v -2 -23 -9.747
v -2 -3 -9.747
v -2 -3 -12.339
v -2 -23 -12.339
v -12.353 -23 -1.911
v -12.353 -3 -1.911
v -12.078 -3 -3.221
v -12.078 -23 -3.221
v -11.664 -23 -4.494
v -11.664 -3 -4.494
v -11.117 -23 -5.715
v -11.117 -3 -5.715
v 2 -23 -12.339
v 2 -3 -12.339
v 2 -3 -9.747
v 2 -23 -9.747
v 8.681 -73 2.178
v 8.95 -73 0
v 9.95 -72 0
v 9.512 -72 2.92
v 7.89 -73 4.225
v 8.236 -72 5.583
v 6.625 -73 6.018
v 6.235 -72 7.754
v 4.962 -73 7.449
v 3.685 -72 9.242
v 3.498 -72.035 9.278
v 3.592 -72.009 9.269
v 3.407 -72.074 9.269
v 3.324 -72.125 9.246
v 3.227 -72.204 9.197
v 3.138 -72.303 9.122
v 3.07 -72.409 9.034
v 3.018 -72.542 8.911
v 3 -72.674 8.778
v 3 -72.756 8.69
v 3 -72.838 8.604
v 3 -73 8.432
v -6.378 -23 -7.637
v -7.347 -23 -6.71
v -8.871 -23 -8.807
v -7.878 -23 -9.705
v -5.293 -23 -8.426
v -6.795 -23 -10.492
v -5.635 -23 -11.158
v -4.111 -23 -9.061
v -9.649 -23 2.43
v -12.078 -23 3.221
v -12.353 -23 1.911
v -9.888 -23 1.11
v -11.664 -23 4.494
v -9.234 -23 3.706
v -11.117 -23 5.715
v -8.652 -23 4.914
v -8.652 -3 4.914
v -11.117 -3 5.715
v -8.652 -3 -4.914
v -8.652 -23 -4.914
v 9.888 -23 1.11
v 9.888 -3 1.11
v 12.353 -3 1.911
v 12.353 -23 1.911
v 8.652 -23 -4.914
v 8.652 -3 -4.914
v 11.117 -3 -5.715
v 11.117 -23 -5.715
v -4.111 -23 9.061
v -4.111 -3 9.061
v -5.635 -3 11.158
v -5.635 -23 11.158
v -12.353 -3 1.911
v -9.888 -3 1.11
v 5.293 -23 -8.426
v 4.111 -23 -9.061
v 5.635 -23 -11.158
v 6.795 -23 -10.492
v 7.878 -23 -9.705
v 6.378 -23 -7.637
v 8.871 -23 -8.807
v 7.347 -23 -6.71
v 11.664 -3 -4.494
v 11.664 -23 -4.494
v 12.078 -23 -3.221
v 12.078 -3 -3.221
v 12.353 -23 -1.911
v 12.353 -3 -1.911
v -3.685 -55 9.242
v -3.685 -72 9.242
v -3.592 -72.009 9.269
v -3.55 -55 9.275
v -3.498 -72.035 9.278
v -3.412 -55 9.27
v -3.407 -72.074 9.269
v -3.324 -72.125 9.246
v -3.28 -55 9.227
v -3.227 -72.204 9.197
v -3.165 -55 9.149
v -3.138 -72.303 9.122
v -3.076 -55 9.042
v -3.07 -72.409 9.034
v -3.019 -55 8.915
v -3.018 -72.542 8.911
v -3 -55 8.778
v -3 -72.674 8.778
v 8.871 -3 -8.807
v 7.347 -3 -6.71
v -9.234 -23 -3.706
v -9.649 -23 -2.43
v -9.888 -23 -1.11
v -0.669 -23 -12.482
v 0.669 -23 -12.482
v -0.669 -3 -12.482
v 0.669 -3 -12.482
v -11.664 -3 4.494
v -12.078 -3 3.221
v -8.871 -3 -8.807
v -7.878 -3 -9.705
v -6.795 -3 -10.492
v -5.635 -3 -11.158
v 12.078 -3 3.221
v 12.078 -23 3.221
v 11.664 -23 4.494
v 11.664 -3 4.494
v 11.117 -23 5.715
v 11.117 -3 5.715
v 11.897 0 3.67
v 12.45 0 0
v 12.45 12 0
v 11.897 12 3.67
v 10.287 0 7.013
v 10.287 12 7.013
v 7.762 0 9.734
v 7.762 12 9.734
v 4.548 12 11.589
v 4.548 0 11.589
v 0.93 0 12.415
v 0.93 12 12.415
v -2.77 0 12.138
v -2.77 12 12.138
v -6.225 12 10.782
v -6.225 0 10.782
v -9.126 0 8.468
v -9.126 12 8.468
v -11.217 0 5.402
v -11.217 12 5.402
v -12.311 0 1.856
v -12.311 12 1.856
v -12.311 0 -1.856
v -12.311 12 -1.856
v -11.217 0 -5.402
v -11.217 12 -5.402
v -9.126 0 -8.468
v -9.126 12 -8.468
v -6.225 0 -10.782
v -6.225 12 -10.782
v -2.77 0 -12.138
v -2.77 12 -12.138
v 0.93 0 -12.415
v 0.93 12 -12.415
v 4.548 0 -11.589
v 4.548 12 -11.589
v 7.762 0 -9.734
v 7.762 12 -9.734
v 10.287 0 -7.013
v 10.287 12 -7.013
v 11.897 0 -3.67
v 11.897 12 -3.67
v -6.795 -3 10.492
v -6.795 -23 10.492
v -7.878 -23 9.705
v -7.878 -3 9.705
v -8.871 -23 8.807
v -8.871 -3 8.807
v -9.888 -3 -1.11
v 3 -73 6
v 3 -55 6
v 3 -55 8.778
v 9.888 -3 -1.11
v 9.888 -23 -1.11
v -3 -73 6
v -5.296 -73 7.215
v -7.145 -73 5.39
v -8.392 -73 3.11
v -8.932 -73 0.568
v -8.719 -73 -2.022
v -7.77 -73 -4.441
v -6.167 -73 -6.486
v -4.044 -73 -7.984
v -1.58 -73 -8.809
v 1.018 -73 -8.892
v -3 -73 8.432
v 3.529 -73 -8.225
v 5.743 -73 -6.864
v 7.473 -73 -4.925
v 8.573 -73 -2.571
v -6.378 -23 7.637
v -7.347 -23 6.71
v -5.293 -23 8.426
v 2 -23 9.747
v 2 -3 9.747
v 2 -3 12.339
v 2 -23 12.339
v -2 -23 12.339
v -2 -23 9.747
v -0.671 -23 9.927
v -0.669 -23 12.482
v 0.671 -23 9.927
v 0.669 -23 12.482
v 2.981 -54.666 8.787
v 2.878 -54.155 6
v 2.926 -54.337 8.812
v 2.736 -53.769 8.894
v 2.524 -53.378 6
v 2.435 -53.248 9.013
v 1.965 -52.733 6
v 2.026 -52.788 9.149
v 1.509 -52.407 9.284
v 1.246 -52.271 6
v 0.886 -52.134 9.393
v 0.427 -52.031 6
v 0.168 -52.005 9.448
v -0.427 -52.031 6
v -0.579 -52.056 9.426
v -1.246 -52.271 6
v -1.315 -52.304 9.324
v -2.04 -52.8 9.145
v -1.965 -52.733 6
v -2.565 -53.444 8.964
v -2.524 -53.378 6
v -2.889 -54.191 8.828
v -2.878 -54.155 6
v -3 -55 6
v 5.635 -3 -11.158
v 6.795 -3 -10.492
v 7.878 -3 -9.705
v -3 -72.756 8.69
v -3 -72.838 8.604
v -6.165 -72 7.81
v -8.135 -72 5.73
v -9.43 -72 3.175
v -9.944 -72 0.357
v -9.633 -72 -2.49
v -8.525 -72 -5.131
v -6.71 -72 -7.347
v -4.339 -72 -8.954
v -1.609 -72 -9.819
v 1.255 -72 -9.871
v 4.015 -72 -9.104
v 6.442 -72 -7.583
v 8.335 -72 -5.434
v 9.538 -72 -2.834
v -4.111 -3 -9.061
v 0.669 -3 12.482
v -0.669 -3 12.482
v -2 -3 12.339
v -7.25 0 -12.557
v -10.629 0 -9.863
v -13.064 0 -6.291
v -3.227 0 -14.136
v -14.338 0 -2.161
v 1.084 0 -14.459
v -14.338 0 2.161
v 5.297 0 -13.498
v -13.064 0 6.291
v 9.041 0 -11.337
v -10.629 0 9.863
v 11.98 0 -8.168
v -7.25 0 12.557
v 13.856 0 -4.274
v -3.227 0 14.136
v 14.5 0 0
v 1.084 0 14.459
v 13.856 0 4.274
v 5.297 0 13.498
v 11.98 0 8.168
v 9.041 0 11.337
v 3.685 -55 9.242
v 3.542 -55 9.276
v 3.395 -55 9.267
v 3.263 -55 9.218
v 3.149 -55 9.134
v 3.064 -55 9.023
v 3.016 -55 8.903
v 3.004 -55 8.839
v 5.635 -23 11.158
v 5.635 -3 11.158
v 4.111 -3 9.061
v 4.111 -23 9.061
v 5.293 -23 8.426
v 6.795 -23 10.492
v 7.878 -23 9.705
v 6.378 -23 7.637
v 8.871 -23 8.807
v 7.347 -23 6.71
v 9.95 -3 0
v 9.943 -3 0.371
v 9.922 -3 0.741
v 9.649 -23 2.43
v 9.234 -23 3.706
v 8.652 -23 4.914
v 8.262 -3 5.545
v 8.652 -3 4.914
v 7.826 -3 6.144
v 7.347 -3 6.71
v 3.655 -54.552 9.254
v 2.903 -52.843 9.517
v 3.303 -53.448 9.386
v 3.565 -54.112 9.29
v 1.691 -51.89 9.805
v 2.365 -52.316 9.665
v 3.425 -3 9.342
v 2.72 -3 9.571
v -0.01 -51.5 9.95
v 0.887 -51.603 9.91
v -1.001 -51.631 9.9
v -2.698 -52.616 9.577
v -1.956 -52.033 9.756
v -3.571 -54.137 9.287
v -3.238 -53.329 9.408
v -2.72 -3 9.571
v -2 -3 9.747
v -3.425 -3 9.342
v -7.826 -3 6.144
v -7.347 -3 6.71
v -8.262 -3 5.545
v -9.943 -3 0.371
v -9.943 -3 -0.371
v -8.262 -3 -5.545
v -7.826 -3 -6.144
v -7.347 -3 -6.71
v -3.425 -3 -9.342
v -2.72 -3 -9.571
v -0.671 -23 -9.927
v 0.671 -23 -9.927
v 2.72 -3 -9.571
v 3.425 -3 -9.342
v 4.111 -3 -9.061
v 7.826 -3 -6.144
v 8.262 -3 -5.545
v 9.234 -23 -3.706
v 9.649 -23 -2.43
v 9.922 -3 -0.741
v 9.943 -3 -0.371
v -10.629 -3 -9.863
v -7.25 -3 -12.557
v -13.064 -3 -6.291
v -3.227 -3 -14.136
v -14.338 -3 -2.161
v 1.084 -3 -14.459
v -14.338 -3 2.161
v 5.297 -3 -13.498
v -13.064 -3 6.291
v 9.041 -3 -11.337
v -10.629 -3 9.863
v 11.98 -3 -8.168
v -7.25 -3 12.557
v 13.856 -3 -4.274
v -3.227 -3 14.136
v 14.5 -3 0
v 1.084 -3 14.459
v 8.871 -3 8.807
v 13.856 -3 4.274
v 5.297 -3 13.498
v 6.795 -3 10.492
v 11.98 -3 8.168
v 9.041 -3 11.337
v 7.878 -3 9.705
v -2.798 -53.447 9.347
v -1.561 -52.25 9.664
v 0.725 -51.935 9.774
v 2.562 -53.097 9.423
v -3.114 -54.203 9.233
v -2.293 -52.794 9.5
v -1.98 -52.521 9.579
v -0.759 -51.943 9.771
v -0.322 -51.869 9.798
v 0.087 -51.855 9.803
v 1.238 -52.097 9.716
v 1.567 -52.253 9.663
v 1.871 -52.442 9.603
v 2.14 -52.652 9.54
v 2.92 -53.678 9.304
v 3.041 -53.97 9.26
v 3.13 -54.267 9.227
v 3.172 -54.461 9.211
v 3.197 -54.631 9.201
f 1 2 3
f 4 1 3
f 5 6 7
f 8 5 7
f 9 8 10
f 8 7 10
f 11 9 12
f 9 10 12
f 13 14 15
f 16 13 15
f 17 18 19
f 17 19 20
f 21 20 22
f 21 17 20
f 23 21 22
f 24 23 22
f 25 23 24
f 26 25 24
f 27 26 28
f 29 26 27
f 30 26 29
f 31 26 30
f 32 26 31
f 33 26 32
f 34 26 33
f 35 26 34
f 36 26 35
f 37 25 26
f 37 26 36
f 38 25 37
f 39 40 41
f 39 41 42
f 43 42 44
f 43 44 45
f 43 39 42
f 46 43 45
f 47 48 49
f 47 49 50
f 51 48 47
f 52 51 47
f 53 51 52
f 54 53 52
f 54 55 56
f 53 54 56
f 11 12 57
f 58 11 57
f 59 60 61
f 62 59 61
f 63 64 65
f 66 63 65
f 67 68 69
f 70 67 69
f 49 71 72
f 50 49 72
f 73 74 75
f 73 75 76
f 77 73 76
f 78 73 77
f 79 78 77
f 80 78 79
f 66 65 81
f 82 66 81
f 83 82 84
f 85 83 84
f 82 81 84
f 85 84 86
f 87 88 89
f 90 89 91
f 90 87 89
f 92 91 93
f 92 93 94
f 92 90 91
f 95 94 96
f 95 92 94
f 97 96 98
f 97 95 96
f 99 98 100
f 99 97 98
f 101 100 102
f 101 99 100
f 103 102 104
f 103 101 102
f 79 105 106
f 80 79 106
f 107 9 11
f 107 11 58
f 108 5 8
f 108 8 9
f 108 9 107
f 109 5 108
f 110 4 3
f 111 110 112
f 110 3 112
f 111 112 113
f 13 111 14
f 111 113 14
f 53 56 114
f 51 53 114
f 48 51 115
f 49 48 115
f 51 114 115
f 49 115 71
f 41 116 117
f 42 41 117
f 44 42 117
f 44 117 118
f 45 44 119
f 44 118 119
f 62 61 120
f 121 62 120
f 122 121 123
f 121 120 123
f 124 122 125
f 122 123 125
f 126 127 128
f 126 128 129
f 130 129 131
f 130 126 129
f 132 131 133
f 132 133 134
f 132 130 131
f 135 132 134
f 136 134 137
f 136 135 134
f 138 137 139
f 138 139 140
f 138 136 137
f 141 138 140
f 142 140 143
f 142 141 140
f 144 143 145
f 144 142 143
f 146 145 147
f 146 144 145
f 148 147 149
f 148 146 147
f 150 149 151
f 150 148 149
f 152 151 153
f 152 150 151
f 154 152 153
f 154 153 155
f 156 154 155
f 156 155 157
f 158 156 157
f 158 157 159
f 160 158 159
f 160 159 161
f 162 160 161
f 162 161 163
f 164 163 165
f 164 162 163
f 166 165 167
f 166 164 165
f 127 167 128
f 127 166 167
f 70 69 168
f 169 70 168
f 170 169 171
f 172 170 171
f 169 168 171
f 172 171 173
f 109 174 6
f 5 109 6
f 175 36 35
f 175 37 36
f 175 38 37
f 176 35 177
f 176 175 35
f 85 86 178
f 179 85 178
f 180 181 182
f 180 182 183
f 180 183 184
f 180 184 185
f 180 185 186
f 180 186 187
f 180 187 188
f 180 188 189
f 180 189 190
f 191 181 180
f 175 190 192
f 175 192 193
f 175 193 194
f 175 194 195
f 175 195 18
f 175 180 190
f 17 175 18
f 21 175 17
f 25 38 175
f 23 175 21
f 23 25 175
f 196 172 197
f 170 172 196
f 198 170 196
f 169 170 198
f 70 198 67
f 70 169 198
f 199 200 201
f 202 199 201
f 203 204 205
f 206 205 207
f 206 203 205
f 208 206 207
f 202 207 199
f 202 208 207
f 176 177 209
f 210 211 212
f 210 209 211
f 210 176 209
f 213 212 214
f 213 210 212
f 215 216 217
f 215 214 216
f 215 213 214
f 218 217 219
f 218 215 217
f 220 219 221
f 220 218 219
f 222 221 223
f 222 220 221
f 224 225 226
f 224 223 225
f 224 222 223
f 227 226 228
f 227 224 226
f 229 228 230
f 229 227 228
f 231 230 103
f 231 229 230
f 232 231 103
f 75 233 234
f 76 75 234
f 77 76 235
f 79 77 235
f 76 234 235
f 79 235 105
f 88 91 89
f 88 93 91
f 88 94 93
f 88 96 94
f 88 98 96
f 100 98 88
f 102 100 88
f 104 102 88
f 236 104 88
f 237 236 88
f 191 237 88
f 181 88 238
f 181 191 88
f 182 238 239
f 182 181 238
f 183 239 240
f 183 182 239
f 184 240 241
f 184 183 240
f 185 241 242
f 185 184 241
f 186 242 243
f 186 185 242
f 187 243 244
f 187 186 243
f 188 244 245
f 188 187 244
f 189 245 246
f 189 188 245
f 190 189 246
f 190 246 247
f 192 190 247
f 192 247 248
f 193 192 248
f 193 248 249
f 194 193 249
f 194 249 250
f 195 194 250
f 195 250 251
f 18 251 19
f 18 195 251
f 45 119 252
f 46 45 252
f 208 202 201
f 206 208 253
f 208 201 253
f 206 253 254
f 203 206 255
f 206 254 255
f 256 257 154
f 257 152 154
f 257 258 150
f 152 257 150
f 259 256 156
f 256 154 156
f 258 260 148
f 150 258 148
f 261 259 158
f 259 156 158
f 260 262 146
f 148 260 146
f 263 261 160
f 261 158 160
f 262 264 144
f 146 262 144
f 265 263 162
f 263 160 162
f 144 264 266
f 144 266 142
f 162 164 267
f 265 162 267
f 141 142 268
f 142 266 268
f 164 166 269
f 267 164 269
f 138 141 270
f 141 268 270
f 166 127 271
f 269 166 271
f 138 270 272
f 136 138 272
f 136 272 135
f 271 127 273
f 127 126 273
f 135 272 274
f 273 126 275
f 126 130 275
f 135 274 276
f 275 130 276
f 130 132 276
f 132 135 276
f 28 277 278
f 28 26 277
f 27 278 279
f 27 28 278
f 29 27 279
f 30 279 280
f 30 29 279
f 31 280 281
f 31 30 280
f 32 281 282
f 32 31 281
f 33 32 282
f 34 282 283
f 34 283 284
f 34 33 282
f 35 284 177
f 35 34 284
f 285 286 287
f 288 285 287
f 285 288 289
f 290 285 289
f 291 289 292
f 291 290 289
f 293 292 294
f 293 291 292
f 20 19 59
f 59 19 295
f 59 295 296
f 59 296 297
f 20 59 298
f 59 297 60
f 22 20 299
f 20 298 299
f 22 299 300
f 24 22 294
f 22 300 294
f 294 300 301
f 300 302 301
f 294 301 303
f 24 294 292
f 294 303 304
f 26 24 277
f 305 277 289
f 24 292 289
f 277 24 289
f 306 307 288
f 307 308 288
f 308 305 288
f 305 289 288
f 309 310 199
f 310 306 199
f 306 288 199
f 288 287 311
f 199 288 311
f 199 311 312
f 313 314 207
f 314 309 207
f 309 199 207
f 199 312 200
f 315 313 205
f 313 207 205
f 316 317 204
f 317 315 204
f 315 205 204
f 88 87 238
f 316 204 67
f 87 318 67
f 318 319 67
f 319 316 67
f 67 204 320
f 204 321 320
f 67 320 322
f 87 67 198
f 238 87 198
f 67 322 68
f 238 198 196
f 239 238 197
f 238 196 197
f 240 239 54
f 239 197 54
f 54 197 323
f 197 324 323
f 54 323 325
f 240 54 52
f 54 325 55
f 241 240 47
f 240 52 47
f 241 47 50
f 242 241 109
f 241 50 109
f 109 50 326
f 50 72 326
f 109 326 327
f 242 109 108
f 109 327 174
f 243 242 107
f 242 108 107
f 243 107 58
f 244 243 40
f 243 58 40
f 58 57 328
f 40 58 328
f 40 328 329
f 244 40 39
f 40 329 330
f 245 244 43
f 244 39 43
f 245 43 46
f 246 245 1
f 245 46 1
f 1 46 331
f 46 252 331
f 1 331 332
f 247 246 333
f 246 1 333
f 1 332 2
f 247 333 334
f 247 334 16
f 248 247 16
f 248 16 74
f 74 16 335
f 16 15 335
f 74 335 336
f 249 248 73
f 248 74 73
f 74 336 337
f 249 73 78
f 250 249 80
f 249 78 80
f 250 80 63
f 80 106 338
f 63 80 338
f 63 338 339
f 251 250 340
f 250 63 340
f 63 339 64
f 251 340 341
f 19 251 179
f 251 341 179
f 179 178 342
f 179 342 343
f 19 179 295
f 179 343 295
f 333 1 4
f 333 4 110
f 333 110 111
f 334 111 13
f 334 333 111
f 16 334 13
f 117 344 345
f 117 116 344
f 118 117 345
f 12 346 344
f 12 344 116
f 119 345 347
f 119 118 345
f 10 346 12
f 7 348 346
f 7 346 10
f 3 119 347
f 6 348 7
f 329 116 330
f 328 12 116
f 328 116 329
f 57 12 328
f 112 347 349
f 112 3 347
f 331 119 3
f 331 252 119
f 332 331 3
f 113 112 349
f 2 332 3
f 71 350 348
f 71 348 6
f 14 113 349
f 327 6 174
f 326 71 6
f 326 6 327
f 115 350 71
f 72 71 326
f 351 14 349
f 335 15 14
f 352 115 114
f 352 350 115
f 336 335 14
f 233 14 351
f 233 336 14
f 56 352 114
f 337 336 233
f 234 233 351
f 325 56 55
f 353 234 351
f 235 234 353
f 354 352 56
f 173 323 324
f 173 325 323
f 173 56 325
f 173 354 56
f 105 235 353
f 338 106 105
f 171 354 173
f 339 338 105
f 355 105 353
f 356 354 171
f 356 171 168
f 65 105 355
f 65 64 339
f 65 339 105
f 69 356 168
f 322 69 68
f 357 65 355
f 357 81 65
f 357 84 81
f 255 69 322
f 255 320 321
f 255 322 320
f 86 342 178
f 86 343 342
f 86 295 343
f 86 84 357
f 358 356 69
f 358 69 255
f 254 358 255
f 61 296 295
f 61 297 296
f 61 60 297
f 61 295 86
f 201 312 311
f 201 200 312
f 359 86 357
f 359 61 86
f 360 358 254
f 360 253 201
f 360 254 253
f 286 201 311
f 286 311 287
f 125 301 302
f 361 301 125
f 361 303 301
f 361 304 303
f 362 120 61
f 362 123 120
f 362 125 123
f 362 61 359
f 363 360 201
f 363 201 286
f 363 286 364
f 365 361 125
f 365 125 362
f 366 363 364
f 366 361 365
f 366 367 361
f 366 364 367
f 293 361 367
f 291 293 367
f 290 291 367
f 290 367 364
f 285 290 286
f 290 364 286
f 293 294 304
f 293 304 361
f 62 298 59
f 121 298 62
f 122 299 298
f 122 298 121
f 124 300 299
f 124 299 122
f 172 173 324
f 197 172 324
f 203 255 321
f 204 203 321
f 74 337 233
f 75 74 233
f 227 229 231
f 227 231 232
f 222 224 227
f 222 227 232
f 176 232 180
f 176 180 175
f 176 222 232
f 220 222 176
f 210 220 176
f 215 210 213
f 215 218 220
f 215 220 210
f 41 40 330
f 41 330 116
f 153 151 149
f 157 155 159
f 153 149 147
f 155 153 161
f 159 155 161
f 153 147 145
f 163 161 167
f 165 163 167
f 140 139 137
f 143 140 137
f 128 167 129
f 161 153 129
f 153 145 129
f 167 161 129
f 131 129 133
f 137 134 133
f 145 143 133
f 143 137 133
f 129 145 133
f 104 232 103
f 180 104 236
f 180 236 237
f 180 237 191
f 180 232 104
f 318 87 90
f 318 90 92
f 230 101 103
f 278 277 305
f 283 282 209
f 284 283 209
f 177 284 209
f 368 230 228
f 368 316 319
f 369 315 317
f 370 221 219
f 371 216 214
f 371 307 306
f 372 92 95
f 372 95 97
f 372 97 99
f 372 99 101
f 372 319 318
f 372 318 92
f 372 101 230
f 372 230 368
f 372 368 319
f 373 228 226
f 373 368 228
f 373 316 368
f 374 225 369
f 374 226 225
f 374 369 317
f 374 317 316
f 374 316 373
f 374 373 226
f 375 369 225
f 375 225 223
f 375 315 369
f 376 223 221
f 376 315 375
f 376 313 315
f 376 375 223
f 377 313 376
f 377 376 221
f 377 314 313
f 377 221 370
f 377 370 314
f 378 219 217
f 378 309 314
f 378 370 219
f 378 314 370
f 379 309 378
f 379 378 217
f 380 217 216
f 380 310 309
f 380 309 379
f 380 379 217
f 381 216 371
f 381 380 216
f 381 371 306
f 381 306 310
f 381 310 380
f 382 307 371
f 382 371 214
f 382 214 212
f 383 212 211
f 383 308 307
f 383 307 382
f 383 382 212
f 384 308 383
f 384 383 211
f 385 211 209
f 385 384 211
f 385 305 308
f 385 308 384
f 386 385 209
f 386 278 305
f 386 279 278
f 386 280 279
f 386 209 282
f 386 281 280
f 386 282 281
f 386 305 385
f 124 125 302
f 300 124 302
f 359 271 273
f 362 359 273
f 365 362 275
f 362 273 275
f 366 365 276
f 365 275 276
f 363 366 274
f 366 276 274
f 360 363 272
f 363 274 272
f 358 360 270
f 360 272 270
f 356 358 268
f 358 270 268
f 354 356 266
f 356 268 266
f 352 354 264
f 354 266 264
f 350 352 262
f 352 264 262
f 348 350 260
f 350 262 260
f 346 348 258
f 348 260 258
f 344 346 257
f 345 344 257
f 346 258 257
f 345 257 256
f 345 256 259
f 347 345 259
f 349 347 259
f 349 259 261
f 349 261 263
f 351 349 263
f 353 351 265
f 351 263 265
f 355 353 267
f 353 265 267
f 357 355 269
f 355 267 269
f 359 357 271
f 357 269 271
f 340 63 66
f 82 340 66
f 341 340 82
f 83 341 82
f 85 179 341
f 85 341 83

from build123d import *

# Parameters (mm, degrees)
F0_R      = 12.45
F1_DEPTH  = 12
F2_R      = 14.5
F3_DEPTH  = 3
F4_R      = 9.95
F5_DEPTH  = 70
F7_DEPTH  = 20
F10_DEPTH = 10
F11_SIZE  = 1
F12_R     = 0.5


with BuildPart() as f1:
    # F0 (on Front) → F1 (new body)
    with BuildSketch(Plane.XZ):
        Circle(F0_R)
    extrude(amount=-F1_DEPTH)

    # F2 (on Front) → F3 (join)
    with BuildSketch(Plane.XZ):
        Circle(F2_R)
    extrude(amount=F3_DEPTH)

    # F4 (on face) → F5 (join)
    with BuildSketch(Plane.XZ.offset(3)):
        Circle(F4_R)
    extrude(amount=F5_DEPTH)

    # F6 (on face) → F7 (join)
    with BuildSketch(Plane.XZ.offset(3)):
        with BuildLine():
            Line((2, 9.7469225913), (2, 12.3389626793))
            ThreePointArc((2, 12.3389626793), (0, 12.5), (-2, 12.3389626793))
            Line((-2, 12.3389626793), (-2, 9.7469225913))
            ThreePointArc((-2, 9.7469225913), (0, 9.95), (2, 9.7469225913))
        make_face()
        with BuildLine():
            ThreePointArc((-7.3471313431, 6.7098555146), (-5.8484632603, 8.049719094), (-4.1110633656, 9.0609965238))
            Line((-4.1110633656, 9.0609965238), (-5.6346263027, 11.1580010051))
            ThreePointArc((-5.6346263027, 11.1580010051), (-7.3473156537, 10.1127124297), (-8.8706942802, 8.8068599959))
            Line((-8.8706942802, 8.8068599959), (-7.3471313431, 6.7098555146))
        make_face()
        with BuildLine():
            ThreePointArc((-9.887908233, 1.109851691), (-9.4630123371, 3.074719094), (-8.6518402555, 4.9140777561))
            Line((-8.6518402555, 4.9140777561), (-11.1170168717, 5.7150621934))
            ThreePointArc((-11.1170168717, 5.7150621934), (-11.8882064537, 3.8627124297), (-12.3530848492, 1.9108361283))
            Line((-12.3530848492, 1.9108361283), (-9.887908233, 1.109851691))
        make_face()
        with BuildLine():
            ThreePointArc((-8.6518402555, -4.9140777561), (-9.4630123371, -3.074719094), (-9.887908233, -1.109851691))
            Line((-9.887908233, -1.109851691), (-12.3530848492, -1.9108361283))
            ThreePointArc((-12.3530848492, -1.9108361283), (-11.8882064537, -3.8627124297), (-11.1170168717, -5.7150621934))
            Line((-11.1170168717, -5.7150621934), (-8.6518402555, -4.9140777561))
        make_face()
        with BuildLine():
            ThreePointArc((-4.1110633656, -9.0609965238), (-5.8484632603, -8.049719094), (-7.3471313431, -6.7098555146))
            Line((-7.3471313431, -6.7098555146), (-8.8706942802, -8.8068599959))
            ThreePointArc((-8.8706942802, -8.8068599959), (-7.3473156537, -10.1127124297), (-5.6346263027, -11.1580010051))
            Line((-5.6346263027, -11.1580010051), (-4.1110633656, -9.0609965238))
        make_face()
        with BuildLine():
            ThreePointArc((2, -9.7469225913), (0, -9.95), (-2, -9.7469225913))
            Line((-2, -9.7469225913), (-2, -12.3389626793))
            ThreePointArc((-2, -12.3389626793), (0, -12.5), (2, -12.3389626793))
            Line((2, -12.3389626793), (2, -9.7469225913))
        make_face()
        with BuildLine():
            Line((8.8706942802, -8.8068599959), (7.3471313431, -6.7098555146))
            ThreePointArc((7.3471313431, -6.7098555146), (5.8484632603, -8.049719094), (4.1110633656, -9.0609965238))
            Line((4.1110633656, -9.0609965238), (5.6346263027, -11.1580010051))
            ThreePointArc((5.6346263027, -11.1580010051), (7.3473156537, -10.1127124297), (8.8706942802, -8.8068599959))
        make_face()
        with BuildLine():
            Line((12.3530848492, -1.9108361283), (9.887908233, -1.109851691))
            ThreePointArc((9.887908233, -1.109851691), (9.4630123371, -3.074719094), (8.6518402555, -4.9140777561))
            Line((8.6518402555, -4.9140777561), (11.1170168717, -5.7150621934))
            ThreePointArc((11.1170168717, -5.7150621934), (11.8882064537, -3.8627124297), (12.3530848492, -1.9108361283))
        make_face()
        with BuildLine():
            Line((11.1170168717, 5.7150621934), (8.6518402555, 4.9140777561))
            ThreePointArc((8.6518402555, 4.9140777561), (9.4630123371, 3.074719094), (9.887908233, 1.109851691))
            Line((9.887908233, 1.109851691), (12.3530848492, 1.9108361283))
            ThreePointArc((12.3530848492, 1.9108361283), (11.8882064537, 3.8627124297), (11.1170168717, 5.7150621934))
        make_face()
        with BuildLine():
            Line((5.6346263027, 11.1580010051), (4.1110633656, 9.0609965238))
            ThreePointArc((4.1110633656, 9.0609965238), (5.8484632603, 8.049719094), (7.3471313431, 6.7098555146))
            Line((7.3471313431, 6.7098555146), (8.8706942802, 8.8068599959))
            ThreePointArc((8.8706942802, 8.8068599959), (7.3473156537, 10.1127124297), (5.6346263027, 11.1580010051))
        make_face()
    extrude(amount=F7_DEPTH)

    # F9 (on offset) → F10 (cut)
    with BuildSketch(Plane.XY.offset(6)):
        with BuildLine():
            Line((-3, -55), (-3, -85))
            Line((-3, -85), (3, -85))
            Line((3, -85), (3, -55))
            ThreePointArc((3, -55), (0, -52), (-3, -55))
        make_face()
    extrude(amount=F10_DEPTH, mode=Mode.SUBTRACT)

    # F11
    f11_edges = [f1.edges().sort_by_distance(p)[0] for p in [
        (-5.880157, -73, -8.026596),
    ]]
    chamfer(f11_edges, length=F11_SIZE)

    # F12
    f12_edges = [f1.edges().sort_by_distance(p)[0] for p in [
        (-3, -63.5, 9.486965),
        (0, -52, 9.95),
        (3, -63.5, 9.486965),
    ]]
    fillet(f12_edges, radius=F12_R)


solid = f1.part
